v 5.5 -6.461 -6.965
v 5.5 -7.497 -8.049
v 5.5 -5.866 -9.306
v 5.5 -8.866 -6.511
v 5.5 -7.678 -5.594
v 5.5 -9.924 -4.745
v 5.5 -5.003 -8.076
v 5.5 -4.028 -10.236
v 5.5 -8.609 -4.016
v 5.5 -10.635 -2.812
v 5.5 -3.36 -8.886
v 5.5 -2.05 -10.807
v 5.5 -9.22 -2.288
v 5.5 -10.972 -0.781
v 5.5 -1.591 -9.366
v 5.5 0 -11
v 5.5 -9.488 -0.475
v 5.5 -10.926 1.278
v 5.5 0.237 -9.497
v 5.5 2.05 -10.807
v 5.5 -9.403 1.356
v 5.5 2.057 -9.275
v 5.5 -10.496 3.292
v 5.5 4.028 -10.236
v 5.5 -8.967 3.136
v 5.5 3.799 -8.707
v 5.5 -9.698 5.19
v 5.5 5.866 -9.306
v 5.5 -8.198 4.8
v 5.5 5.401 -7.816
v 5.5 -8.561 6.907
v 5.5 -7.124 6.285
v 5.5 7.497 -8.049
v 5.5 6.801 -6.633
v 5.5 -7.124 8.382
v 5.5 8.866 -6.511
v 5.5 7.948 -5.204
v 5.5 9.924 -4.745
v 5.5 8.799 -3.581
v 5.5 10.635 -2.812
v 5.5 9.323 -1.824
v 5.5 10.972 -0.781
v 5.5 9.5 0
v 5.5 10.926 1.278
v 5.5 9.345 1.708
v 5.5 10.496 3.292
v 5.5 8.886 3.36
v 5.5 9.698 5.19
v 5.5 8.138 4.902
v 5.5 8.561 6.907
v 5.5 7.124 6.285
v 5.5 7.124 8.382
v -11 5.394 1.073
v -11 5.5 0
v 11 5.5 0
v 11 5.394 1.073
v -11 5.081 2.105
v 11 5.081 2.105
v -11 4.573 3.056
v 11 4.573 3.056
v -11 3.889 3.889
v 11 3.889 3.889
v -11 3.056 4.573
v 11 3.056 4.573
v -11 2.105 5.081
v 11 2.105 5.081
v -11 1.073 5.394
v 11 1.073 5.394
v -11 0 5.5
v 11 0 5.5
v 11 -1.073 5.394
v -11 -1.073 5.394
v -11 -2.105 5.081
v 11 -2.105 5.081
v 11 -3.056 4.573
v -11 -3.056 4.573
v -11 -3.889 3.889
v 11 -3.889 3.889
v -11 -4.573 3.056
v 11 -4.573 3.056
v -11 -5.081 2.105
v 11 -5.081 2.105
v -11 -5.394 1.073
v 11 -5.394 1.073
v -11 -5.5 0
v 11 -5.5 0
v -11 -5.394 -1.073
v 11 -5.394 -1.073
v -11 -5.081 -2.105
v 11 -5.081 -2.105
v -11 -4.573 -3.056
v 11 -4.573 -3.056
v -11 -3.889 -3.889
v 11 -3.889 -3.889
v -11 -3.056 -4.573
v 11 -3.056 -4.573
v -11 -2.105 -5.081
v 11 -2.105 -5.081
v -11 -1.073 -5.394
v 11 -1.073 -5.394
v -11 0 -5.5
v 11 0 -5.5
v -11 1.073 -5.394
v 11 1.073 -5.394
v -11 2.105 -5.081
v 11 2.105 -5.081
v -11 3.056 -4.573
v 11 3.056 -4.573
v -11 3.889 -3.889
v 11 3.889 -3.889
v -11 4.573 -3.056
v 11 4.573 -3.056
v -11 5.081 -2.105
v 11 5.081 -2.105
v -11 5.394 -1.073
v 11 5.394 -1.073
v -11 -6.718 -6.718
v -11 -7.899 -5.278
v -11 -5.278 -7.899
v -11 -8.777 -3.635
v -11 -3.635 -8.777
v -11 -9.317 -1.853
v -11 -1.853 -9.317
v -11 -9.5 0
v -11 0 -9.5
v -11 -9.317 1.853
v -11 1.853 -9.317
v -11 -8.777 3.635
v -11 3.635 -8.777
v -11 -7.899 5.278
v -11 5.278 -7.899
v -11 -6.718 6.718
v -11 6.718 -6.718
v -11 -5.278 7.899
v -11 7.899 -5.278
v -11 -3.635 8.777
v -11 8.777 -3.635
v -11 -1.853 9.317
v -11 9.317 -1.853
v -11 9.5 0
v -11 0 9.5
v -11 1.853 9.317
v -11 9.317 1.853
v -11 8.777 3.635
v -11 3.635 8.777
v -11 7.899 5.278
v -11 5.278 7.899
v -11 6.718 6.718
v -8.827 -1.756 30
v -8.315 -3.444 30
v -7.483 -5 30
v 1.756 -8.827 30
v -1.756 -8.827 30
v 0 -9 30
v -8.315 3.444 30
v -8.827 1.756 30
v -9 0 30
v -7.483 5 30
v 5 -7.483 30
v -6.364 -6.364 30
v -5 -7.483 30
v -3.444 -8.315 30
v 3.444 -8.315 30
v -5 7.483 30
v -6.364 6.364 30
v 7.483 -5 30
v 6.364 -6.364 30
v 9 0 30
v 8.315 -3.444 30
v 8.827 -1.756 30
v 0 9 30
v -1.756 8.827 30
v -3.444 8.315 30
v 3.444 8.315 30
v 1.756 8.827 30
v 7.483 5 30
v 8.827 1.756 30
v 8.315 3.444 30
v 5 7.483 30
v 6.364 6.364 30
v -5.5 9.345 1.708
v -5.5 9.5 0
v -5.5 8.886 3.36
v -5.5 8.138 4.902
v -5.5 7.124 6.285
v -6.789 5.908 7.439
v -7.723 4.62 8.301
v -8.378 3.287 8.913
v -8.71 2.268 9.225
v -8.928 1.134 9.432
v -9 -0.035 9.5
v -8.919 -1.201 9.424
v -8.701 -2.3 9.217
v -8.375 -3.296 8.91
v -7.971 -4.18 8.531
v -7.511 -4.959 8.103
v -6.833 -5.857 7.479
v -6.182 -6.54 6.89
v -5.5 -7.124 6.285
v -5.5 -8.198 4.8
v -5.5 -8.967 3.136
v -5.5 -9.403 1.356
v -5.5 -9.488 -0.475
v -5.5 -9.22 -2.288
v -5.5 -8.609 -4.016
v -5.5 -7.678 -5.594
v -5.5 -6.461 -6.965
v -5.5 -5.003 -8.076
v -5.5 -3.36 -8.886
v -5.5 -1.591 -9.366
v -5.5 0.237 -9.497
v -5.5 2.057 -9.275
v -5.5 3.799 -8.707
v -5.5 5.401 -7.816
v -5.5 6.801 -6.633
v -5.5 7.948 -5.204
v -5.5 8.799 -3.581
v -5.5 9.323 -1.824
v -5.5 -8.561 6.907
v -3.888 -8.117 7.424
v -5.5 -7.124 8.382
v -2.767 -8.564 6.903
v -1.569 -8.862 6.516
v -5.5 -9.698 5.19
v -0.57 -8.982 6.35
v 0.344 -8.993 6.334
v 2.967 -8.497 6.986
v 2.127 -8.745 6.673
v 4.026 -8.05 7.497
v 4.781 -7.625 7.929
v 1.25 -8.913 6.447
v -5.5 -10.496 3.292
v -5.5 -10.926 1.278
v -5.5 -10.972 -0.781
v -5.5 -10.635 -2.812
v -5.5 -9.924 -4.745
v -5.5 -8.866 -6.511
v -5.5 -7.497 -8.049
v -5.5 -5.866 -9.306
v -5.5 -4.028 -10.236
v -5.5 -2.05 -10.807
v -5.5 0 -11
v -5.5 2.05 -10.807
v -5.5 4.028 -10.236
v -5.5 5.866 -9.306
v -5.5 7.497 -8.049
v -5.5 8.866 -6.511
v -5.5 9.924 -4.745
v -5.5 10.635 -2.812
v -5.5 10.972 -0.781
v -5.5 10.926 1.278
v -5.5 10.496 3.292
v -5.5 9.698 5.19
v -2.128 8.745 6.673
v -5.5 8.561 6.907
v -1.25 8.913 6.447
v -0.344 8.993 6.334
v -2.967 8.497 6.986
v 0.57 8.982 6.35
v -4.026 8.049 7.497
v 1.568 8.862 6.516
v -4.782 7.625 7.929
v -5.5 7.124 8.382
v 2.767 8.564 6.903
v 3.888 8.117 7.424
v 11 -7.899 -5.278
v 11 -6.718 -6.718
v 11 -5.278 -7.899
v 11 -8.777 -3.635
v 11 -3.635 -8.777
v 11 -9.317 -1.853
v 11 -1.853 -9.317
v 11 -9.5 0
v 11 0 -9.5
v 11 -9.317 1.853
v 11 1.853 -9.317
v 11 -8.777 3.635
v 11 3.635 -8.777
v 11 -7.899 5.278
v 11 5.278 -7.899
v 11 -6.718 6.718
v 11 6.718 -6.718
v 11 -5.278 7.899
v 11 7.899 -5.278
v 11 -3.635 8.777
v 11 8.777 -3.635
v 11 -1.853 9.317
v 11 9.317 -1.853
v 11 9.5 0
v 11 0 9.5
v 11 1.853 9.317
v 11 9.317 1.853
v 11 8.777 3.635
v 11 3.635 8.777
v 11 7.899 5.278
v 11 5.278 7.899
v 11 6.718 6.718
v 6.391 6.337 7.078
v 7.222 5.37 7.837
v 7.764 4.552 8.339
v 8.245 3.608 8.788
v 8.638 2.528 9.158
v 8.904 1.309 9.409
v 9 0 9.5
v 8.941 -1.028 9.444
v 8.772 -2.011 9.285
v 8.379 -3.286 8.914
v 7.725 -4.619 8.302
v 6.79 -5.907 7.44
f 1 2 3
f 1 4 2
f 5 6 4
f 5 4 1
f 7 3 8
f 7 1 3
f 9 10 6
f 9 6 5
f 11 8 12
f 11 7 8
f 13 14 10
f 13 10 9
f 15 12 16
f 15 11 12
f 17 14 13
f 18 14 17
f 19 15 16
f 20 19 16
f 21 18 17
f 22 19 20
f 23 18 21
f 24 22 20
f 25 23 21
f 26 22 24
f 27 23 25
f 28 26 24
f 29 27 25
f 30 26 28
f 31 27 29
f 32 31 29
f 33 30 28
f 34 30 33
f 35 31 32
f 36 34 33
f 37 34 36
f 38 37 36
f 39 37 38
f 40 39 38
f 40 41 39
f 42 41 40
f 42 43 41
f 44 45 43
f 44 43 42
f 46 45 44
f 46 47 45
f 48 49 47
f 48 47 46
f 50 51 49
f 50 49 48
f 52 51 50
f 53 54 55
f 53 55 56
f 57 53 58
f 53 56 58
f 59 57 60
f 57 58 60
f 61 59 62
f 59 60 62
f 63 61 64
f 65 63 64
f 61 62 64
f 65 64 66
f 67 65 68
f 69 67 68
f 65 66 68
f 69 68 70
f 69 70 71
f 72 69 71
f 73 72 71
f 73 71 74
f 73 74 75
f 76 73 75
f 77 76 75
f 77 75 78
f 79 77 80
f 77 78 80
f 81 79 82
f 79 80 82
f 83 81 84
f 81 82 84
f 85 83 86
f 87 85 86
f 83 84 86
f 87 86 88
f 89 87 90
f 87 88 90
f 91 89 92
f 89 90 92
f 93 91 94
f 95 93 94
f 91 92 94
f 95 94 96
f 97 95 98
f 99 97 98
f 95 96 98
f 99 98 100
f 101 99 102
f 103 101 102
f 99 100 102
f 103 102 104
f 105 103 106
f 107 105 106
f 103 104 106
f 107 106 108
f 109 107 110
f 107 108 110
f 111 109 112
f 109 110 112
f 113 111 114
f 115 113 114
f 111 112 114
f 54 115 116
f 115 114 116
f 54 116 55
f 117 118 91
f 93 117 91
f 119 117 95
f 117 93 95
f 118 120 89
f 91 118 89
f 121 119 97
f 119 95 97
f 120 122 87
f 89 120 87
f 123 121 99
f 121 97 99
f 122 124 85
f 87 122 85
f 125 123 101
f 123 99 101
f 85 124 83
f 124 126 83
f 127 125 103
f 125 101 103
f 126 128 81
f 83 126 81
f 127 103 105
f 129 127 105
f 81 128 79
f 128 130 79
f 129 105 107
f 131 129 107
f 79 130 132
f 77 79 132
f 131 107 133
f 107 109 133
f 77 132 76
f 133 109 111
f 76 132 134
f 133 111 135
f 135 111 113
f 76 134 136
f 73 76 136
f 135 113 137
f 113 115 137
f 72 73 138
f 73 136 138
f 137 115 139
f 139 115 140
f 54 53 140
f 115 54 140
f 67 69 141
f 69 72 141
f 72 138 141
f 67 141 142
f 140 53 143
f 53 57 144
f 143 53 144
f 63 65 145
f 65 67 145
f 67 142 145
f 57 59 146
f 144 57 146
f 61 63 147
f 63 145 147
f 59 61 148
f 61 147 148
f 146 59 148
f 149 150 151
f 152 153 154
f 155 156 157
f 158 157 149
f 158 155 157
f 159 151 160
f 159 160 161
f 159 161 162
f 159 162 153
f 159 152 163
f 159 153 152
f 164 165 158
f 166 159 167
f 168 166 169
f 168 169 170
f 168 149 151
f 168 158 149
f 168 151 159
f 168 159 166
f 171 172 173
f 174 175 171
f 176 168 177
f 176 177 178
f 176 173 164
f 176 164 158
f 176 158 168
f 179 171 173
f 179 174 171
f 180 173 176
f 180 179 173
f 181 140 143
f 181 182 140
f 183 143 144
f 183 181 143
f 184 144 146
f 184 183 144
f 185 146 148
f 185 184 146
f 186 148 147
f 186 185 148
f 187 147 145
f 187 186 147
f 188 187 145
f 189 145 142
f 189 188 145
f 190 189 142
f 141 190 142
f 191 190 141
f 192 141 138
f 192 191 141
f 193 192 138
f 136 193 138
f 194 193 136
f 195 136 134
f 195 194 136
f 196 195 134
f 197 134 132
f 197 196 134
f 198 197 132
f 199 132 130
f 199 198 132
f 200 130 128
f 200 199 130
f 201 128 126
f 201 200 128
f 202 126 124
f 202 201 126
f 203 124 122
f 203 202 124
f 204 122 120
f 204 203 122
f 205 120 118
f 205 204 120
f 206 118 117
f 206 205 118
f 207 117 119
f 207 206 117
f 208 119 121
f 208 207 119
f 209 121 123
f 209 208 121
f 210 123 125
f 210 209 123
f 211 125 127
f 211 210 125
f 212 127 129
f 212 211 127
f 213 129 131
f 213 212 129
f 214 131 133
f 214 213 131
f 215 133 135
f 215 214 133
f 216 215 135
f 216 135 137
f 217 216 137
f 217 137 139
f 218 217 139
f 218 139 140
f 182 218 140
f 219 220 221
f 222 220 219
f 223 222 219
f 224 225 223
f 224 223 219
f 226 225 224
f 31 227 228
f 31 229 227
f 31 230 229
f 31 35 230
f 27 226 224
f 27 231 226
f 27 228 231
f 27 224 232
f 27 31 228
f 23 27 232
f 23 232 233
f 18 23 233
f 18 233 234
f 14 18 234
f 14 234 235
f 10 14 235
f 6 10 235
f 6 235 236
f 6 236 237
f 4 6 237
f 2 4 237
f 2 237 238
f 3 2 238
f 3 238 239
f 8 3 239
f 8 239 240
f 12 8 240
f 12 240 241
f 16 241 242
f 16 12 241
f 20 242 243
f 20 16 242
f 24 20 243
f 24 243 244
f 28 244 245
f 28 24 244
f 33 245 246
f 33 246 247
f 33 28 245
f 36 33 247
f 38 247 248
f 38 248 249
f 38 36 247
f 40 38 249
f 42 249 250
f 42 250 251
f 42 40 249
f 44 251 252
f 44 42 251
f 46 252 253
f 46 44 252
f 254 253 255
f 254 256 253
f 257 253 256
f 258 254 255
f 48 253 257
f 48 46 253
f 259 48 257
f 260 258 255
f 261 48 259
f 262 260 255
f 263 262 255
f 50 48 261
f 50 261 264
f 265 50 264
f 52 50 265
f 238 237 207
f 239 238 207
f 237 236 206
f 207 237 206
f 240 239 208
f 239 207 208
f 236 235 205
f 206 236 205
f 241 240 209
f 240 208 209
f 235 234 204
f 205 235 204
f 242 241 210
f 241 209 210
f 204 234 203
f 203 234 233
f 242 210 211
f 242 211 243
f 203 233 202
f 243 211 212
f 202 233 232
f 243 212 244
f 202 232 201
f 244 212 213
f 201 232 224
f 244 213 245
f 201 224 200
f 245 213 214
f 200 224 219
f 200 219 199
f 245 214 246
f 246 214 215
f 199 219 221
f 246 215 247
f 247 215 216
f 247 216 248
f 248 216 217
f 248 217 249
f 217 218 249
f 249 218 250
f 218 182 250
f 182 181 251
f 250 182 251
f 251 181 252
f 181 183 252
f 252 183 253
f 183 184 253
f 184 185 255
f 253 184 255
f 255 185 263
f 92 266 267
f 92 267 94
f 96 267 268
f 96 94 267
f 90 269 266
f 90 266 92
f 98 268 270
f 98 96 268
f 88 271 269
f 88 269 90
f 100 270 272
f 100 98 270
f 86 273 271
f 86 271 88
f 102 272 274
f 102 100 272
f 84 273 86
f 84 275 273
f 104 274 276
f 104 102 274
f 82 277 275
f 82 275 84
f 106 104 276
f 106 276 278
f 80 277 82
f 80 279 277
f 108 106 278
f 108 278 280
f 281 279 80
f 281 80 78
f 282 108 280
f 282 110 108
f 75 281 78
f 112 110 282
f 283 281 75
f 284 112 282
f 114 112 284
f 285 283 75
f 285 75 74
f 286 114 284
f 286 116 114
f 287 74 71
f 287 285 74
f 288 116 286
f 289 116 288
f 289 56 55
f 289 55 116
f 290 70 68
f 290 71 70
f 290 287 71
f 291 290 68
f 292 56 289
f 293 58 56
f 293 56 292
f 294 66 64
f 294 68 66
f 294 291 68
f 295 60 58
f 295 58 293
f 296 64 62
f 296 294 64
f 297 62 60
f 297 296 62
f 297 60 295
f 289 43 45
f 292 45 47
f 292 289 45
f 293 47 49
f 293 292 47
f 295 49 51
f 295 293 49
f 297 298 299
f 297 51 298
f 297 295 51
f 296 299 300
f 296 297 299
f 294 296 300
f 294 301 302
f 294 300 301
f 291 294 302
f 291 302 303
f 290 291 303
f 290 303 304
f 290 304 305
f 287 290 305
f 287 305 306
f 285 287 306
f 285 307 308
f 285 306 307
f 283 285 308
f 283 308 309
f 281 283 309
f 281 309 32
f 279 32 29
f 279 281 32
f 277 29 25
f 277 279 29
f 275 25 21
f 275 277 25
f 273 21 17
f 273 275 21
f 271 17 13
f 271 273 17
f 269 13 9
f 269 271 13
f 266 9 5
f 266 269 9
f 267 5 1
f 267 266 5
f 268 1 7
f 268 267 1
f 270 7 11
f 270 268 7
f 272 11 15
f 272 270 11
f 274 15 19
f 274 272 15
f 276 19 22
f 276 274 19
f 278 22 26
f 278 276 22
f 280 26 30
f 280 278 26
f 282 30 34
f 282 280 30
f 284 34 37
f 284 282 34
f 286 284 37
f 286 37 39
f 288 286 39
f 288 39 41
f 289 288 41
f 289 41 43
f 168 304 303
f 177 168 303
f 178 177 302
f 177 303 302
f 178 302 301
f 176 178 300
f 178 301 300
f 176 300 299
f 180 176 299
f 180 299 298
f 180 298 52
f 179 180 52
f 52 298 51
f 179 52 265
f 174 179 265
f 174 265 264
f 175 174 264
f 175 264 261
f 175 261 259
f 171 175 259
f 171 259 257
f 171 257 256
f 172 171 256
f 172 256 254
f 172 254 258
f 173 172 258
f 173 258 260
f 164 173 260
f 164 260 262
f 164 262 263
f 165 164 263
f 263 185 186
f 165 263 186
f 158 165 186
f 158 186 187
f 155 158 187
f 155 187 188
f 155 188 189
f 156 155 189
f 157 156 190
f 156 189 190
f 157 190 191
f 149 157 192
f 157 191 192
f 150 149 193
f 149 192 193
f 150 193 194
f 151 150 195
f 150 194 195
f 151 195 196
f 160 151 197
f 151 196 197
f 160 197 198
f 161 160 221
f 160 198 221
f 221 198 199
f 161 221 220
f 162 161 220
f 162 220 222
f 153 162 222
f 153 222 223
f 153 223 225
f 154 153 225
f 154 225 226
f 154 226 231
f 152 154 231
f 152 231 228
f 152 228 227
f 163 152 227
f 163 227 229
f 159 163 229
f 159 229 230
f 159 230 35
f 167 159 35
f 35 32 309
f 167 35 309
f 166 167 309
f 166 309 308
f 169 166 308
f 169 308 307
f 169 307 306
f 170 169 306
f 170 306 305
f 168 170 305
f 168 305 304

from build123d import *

# Parameters (mm, degrees)
F0_R     = 9.5
F1_DEPTH = 11
F2_R     = 9
F3_DEPTH = 30
F5_R     = 11
F6_DEPTH = 5.5
F7_R     = 5.5
F8_DEPTH = 38.19265


with BuildPart() as f1:
    # F0 (on Right) → F1 (new body, symmetric)
    with BuildSketch(Plane.YZ):
        Circle(F0_R)
    extrude(amount=F1_DEPTH, both=True)

    # F2 (on Top) → F3 (join)
    with BuildSketch(Plane.XY):
        Circle(F2_R)
    extrude(amount=F3_DEPTH)

    # F5 (on Right) → F6 (join, symmetric)
    with BuildSketch(Plane.YZ):
        Circle(F5_R)
    extrude(amount=F6_DEPTH, both=True)

    # F7 (on offset) → F8 (cut, symmetric)
    with BuildSketch(Plane.YZ.offset(13)):
        Circle(F7_R)
    extrude(amount=F8_DEPTH, both=True, mode=Mode.SUBTRACT)


solid = f1.part
